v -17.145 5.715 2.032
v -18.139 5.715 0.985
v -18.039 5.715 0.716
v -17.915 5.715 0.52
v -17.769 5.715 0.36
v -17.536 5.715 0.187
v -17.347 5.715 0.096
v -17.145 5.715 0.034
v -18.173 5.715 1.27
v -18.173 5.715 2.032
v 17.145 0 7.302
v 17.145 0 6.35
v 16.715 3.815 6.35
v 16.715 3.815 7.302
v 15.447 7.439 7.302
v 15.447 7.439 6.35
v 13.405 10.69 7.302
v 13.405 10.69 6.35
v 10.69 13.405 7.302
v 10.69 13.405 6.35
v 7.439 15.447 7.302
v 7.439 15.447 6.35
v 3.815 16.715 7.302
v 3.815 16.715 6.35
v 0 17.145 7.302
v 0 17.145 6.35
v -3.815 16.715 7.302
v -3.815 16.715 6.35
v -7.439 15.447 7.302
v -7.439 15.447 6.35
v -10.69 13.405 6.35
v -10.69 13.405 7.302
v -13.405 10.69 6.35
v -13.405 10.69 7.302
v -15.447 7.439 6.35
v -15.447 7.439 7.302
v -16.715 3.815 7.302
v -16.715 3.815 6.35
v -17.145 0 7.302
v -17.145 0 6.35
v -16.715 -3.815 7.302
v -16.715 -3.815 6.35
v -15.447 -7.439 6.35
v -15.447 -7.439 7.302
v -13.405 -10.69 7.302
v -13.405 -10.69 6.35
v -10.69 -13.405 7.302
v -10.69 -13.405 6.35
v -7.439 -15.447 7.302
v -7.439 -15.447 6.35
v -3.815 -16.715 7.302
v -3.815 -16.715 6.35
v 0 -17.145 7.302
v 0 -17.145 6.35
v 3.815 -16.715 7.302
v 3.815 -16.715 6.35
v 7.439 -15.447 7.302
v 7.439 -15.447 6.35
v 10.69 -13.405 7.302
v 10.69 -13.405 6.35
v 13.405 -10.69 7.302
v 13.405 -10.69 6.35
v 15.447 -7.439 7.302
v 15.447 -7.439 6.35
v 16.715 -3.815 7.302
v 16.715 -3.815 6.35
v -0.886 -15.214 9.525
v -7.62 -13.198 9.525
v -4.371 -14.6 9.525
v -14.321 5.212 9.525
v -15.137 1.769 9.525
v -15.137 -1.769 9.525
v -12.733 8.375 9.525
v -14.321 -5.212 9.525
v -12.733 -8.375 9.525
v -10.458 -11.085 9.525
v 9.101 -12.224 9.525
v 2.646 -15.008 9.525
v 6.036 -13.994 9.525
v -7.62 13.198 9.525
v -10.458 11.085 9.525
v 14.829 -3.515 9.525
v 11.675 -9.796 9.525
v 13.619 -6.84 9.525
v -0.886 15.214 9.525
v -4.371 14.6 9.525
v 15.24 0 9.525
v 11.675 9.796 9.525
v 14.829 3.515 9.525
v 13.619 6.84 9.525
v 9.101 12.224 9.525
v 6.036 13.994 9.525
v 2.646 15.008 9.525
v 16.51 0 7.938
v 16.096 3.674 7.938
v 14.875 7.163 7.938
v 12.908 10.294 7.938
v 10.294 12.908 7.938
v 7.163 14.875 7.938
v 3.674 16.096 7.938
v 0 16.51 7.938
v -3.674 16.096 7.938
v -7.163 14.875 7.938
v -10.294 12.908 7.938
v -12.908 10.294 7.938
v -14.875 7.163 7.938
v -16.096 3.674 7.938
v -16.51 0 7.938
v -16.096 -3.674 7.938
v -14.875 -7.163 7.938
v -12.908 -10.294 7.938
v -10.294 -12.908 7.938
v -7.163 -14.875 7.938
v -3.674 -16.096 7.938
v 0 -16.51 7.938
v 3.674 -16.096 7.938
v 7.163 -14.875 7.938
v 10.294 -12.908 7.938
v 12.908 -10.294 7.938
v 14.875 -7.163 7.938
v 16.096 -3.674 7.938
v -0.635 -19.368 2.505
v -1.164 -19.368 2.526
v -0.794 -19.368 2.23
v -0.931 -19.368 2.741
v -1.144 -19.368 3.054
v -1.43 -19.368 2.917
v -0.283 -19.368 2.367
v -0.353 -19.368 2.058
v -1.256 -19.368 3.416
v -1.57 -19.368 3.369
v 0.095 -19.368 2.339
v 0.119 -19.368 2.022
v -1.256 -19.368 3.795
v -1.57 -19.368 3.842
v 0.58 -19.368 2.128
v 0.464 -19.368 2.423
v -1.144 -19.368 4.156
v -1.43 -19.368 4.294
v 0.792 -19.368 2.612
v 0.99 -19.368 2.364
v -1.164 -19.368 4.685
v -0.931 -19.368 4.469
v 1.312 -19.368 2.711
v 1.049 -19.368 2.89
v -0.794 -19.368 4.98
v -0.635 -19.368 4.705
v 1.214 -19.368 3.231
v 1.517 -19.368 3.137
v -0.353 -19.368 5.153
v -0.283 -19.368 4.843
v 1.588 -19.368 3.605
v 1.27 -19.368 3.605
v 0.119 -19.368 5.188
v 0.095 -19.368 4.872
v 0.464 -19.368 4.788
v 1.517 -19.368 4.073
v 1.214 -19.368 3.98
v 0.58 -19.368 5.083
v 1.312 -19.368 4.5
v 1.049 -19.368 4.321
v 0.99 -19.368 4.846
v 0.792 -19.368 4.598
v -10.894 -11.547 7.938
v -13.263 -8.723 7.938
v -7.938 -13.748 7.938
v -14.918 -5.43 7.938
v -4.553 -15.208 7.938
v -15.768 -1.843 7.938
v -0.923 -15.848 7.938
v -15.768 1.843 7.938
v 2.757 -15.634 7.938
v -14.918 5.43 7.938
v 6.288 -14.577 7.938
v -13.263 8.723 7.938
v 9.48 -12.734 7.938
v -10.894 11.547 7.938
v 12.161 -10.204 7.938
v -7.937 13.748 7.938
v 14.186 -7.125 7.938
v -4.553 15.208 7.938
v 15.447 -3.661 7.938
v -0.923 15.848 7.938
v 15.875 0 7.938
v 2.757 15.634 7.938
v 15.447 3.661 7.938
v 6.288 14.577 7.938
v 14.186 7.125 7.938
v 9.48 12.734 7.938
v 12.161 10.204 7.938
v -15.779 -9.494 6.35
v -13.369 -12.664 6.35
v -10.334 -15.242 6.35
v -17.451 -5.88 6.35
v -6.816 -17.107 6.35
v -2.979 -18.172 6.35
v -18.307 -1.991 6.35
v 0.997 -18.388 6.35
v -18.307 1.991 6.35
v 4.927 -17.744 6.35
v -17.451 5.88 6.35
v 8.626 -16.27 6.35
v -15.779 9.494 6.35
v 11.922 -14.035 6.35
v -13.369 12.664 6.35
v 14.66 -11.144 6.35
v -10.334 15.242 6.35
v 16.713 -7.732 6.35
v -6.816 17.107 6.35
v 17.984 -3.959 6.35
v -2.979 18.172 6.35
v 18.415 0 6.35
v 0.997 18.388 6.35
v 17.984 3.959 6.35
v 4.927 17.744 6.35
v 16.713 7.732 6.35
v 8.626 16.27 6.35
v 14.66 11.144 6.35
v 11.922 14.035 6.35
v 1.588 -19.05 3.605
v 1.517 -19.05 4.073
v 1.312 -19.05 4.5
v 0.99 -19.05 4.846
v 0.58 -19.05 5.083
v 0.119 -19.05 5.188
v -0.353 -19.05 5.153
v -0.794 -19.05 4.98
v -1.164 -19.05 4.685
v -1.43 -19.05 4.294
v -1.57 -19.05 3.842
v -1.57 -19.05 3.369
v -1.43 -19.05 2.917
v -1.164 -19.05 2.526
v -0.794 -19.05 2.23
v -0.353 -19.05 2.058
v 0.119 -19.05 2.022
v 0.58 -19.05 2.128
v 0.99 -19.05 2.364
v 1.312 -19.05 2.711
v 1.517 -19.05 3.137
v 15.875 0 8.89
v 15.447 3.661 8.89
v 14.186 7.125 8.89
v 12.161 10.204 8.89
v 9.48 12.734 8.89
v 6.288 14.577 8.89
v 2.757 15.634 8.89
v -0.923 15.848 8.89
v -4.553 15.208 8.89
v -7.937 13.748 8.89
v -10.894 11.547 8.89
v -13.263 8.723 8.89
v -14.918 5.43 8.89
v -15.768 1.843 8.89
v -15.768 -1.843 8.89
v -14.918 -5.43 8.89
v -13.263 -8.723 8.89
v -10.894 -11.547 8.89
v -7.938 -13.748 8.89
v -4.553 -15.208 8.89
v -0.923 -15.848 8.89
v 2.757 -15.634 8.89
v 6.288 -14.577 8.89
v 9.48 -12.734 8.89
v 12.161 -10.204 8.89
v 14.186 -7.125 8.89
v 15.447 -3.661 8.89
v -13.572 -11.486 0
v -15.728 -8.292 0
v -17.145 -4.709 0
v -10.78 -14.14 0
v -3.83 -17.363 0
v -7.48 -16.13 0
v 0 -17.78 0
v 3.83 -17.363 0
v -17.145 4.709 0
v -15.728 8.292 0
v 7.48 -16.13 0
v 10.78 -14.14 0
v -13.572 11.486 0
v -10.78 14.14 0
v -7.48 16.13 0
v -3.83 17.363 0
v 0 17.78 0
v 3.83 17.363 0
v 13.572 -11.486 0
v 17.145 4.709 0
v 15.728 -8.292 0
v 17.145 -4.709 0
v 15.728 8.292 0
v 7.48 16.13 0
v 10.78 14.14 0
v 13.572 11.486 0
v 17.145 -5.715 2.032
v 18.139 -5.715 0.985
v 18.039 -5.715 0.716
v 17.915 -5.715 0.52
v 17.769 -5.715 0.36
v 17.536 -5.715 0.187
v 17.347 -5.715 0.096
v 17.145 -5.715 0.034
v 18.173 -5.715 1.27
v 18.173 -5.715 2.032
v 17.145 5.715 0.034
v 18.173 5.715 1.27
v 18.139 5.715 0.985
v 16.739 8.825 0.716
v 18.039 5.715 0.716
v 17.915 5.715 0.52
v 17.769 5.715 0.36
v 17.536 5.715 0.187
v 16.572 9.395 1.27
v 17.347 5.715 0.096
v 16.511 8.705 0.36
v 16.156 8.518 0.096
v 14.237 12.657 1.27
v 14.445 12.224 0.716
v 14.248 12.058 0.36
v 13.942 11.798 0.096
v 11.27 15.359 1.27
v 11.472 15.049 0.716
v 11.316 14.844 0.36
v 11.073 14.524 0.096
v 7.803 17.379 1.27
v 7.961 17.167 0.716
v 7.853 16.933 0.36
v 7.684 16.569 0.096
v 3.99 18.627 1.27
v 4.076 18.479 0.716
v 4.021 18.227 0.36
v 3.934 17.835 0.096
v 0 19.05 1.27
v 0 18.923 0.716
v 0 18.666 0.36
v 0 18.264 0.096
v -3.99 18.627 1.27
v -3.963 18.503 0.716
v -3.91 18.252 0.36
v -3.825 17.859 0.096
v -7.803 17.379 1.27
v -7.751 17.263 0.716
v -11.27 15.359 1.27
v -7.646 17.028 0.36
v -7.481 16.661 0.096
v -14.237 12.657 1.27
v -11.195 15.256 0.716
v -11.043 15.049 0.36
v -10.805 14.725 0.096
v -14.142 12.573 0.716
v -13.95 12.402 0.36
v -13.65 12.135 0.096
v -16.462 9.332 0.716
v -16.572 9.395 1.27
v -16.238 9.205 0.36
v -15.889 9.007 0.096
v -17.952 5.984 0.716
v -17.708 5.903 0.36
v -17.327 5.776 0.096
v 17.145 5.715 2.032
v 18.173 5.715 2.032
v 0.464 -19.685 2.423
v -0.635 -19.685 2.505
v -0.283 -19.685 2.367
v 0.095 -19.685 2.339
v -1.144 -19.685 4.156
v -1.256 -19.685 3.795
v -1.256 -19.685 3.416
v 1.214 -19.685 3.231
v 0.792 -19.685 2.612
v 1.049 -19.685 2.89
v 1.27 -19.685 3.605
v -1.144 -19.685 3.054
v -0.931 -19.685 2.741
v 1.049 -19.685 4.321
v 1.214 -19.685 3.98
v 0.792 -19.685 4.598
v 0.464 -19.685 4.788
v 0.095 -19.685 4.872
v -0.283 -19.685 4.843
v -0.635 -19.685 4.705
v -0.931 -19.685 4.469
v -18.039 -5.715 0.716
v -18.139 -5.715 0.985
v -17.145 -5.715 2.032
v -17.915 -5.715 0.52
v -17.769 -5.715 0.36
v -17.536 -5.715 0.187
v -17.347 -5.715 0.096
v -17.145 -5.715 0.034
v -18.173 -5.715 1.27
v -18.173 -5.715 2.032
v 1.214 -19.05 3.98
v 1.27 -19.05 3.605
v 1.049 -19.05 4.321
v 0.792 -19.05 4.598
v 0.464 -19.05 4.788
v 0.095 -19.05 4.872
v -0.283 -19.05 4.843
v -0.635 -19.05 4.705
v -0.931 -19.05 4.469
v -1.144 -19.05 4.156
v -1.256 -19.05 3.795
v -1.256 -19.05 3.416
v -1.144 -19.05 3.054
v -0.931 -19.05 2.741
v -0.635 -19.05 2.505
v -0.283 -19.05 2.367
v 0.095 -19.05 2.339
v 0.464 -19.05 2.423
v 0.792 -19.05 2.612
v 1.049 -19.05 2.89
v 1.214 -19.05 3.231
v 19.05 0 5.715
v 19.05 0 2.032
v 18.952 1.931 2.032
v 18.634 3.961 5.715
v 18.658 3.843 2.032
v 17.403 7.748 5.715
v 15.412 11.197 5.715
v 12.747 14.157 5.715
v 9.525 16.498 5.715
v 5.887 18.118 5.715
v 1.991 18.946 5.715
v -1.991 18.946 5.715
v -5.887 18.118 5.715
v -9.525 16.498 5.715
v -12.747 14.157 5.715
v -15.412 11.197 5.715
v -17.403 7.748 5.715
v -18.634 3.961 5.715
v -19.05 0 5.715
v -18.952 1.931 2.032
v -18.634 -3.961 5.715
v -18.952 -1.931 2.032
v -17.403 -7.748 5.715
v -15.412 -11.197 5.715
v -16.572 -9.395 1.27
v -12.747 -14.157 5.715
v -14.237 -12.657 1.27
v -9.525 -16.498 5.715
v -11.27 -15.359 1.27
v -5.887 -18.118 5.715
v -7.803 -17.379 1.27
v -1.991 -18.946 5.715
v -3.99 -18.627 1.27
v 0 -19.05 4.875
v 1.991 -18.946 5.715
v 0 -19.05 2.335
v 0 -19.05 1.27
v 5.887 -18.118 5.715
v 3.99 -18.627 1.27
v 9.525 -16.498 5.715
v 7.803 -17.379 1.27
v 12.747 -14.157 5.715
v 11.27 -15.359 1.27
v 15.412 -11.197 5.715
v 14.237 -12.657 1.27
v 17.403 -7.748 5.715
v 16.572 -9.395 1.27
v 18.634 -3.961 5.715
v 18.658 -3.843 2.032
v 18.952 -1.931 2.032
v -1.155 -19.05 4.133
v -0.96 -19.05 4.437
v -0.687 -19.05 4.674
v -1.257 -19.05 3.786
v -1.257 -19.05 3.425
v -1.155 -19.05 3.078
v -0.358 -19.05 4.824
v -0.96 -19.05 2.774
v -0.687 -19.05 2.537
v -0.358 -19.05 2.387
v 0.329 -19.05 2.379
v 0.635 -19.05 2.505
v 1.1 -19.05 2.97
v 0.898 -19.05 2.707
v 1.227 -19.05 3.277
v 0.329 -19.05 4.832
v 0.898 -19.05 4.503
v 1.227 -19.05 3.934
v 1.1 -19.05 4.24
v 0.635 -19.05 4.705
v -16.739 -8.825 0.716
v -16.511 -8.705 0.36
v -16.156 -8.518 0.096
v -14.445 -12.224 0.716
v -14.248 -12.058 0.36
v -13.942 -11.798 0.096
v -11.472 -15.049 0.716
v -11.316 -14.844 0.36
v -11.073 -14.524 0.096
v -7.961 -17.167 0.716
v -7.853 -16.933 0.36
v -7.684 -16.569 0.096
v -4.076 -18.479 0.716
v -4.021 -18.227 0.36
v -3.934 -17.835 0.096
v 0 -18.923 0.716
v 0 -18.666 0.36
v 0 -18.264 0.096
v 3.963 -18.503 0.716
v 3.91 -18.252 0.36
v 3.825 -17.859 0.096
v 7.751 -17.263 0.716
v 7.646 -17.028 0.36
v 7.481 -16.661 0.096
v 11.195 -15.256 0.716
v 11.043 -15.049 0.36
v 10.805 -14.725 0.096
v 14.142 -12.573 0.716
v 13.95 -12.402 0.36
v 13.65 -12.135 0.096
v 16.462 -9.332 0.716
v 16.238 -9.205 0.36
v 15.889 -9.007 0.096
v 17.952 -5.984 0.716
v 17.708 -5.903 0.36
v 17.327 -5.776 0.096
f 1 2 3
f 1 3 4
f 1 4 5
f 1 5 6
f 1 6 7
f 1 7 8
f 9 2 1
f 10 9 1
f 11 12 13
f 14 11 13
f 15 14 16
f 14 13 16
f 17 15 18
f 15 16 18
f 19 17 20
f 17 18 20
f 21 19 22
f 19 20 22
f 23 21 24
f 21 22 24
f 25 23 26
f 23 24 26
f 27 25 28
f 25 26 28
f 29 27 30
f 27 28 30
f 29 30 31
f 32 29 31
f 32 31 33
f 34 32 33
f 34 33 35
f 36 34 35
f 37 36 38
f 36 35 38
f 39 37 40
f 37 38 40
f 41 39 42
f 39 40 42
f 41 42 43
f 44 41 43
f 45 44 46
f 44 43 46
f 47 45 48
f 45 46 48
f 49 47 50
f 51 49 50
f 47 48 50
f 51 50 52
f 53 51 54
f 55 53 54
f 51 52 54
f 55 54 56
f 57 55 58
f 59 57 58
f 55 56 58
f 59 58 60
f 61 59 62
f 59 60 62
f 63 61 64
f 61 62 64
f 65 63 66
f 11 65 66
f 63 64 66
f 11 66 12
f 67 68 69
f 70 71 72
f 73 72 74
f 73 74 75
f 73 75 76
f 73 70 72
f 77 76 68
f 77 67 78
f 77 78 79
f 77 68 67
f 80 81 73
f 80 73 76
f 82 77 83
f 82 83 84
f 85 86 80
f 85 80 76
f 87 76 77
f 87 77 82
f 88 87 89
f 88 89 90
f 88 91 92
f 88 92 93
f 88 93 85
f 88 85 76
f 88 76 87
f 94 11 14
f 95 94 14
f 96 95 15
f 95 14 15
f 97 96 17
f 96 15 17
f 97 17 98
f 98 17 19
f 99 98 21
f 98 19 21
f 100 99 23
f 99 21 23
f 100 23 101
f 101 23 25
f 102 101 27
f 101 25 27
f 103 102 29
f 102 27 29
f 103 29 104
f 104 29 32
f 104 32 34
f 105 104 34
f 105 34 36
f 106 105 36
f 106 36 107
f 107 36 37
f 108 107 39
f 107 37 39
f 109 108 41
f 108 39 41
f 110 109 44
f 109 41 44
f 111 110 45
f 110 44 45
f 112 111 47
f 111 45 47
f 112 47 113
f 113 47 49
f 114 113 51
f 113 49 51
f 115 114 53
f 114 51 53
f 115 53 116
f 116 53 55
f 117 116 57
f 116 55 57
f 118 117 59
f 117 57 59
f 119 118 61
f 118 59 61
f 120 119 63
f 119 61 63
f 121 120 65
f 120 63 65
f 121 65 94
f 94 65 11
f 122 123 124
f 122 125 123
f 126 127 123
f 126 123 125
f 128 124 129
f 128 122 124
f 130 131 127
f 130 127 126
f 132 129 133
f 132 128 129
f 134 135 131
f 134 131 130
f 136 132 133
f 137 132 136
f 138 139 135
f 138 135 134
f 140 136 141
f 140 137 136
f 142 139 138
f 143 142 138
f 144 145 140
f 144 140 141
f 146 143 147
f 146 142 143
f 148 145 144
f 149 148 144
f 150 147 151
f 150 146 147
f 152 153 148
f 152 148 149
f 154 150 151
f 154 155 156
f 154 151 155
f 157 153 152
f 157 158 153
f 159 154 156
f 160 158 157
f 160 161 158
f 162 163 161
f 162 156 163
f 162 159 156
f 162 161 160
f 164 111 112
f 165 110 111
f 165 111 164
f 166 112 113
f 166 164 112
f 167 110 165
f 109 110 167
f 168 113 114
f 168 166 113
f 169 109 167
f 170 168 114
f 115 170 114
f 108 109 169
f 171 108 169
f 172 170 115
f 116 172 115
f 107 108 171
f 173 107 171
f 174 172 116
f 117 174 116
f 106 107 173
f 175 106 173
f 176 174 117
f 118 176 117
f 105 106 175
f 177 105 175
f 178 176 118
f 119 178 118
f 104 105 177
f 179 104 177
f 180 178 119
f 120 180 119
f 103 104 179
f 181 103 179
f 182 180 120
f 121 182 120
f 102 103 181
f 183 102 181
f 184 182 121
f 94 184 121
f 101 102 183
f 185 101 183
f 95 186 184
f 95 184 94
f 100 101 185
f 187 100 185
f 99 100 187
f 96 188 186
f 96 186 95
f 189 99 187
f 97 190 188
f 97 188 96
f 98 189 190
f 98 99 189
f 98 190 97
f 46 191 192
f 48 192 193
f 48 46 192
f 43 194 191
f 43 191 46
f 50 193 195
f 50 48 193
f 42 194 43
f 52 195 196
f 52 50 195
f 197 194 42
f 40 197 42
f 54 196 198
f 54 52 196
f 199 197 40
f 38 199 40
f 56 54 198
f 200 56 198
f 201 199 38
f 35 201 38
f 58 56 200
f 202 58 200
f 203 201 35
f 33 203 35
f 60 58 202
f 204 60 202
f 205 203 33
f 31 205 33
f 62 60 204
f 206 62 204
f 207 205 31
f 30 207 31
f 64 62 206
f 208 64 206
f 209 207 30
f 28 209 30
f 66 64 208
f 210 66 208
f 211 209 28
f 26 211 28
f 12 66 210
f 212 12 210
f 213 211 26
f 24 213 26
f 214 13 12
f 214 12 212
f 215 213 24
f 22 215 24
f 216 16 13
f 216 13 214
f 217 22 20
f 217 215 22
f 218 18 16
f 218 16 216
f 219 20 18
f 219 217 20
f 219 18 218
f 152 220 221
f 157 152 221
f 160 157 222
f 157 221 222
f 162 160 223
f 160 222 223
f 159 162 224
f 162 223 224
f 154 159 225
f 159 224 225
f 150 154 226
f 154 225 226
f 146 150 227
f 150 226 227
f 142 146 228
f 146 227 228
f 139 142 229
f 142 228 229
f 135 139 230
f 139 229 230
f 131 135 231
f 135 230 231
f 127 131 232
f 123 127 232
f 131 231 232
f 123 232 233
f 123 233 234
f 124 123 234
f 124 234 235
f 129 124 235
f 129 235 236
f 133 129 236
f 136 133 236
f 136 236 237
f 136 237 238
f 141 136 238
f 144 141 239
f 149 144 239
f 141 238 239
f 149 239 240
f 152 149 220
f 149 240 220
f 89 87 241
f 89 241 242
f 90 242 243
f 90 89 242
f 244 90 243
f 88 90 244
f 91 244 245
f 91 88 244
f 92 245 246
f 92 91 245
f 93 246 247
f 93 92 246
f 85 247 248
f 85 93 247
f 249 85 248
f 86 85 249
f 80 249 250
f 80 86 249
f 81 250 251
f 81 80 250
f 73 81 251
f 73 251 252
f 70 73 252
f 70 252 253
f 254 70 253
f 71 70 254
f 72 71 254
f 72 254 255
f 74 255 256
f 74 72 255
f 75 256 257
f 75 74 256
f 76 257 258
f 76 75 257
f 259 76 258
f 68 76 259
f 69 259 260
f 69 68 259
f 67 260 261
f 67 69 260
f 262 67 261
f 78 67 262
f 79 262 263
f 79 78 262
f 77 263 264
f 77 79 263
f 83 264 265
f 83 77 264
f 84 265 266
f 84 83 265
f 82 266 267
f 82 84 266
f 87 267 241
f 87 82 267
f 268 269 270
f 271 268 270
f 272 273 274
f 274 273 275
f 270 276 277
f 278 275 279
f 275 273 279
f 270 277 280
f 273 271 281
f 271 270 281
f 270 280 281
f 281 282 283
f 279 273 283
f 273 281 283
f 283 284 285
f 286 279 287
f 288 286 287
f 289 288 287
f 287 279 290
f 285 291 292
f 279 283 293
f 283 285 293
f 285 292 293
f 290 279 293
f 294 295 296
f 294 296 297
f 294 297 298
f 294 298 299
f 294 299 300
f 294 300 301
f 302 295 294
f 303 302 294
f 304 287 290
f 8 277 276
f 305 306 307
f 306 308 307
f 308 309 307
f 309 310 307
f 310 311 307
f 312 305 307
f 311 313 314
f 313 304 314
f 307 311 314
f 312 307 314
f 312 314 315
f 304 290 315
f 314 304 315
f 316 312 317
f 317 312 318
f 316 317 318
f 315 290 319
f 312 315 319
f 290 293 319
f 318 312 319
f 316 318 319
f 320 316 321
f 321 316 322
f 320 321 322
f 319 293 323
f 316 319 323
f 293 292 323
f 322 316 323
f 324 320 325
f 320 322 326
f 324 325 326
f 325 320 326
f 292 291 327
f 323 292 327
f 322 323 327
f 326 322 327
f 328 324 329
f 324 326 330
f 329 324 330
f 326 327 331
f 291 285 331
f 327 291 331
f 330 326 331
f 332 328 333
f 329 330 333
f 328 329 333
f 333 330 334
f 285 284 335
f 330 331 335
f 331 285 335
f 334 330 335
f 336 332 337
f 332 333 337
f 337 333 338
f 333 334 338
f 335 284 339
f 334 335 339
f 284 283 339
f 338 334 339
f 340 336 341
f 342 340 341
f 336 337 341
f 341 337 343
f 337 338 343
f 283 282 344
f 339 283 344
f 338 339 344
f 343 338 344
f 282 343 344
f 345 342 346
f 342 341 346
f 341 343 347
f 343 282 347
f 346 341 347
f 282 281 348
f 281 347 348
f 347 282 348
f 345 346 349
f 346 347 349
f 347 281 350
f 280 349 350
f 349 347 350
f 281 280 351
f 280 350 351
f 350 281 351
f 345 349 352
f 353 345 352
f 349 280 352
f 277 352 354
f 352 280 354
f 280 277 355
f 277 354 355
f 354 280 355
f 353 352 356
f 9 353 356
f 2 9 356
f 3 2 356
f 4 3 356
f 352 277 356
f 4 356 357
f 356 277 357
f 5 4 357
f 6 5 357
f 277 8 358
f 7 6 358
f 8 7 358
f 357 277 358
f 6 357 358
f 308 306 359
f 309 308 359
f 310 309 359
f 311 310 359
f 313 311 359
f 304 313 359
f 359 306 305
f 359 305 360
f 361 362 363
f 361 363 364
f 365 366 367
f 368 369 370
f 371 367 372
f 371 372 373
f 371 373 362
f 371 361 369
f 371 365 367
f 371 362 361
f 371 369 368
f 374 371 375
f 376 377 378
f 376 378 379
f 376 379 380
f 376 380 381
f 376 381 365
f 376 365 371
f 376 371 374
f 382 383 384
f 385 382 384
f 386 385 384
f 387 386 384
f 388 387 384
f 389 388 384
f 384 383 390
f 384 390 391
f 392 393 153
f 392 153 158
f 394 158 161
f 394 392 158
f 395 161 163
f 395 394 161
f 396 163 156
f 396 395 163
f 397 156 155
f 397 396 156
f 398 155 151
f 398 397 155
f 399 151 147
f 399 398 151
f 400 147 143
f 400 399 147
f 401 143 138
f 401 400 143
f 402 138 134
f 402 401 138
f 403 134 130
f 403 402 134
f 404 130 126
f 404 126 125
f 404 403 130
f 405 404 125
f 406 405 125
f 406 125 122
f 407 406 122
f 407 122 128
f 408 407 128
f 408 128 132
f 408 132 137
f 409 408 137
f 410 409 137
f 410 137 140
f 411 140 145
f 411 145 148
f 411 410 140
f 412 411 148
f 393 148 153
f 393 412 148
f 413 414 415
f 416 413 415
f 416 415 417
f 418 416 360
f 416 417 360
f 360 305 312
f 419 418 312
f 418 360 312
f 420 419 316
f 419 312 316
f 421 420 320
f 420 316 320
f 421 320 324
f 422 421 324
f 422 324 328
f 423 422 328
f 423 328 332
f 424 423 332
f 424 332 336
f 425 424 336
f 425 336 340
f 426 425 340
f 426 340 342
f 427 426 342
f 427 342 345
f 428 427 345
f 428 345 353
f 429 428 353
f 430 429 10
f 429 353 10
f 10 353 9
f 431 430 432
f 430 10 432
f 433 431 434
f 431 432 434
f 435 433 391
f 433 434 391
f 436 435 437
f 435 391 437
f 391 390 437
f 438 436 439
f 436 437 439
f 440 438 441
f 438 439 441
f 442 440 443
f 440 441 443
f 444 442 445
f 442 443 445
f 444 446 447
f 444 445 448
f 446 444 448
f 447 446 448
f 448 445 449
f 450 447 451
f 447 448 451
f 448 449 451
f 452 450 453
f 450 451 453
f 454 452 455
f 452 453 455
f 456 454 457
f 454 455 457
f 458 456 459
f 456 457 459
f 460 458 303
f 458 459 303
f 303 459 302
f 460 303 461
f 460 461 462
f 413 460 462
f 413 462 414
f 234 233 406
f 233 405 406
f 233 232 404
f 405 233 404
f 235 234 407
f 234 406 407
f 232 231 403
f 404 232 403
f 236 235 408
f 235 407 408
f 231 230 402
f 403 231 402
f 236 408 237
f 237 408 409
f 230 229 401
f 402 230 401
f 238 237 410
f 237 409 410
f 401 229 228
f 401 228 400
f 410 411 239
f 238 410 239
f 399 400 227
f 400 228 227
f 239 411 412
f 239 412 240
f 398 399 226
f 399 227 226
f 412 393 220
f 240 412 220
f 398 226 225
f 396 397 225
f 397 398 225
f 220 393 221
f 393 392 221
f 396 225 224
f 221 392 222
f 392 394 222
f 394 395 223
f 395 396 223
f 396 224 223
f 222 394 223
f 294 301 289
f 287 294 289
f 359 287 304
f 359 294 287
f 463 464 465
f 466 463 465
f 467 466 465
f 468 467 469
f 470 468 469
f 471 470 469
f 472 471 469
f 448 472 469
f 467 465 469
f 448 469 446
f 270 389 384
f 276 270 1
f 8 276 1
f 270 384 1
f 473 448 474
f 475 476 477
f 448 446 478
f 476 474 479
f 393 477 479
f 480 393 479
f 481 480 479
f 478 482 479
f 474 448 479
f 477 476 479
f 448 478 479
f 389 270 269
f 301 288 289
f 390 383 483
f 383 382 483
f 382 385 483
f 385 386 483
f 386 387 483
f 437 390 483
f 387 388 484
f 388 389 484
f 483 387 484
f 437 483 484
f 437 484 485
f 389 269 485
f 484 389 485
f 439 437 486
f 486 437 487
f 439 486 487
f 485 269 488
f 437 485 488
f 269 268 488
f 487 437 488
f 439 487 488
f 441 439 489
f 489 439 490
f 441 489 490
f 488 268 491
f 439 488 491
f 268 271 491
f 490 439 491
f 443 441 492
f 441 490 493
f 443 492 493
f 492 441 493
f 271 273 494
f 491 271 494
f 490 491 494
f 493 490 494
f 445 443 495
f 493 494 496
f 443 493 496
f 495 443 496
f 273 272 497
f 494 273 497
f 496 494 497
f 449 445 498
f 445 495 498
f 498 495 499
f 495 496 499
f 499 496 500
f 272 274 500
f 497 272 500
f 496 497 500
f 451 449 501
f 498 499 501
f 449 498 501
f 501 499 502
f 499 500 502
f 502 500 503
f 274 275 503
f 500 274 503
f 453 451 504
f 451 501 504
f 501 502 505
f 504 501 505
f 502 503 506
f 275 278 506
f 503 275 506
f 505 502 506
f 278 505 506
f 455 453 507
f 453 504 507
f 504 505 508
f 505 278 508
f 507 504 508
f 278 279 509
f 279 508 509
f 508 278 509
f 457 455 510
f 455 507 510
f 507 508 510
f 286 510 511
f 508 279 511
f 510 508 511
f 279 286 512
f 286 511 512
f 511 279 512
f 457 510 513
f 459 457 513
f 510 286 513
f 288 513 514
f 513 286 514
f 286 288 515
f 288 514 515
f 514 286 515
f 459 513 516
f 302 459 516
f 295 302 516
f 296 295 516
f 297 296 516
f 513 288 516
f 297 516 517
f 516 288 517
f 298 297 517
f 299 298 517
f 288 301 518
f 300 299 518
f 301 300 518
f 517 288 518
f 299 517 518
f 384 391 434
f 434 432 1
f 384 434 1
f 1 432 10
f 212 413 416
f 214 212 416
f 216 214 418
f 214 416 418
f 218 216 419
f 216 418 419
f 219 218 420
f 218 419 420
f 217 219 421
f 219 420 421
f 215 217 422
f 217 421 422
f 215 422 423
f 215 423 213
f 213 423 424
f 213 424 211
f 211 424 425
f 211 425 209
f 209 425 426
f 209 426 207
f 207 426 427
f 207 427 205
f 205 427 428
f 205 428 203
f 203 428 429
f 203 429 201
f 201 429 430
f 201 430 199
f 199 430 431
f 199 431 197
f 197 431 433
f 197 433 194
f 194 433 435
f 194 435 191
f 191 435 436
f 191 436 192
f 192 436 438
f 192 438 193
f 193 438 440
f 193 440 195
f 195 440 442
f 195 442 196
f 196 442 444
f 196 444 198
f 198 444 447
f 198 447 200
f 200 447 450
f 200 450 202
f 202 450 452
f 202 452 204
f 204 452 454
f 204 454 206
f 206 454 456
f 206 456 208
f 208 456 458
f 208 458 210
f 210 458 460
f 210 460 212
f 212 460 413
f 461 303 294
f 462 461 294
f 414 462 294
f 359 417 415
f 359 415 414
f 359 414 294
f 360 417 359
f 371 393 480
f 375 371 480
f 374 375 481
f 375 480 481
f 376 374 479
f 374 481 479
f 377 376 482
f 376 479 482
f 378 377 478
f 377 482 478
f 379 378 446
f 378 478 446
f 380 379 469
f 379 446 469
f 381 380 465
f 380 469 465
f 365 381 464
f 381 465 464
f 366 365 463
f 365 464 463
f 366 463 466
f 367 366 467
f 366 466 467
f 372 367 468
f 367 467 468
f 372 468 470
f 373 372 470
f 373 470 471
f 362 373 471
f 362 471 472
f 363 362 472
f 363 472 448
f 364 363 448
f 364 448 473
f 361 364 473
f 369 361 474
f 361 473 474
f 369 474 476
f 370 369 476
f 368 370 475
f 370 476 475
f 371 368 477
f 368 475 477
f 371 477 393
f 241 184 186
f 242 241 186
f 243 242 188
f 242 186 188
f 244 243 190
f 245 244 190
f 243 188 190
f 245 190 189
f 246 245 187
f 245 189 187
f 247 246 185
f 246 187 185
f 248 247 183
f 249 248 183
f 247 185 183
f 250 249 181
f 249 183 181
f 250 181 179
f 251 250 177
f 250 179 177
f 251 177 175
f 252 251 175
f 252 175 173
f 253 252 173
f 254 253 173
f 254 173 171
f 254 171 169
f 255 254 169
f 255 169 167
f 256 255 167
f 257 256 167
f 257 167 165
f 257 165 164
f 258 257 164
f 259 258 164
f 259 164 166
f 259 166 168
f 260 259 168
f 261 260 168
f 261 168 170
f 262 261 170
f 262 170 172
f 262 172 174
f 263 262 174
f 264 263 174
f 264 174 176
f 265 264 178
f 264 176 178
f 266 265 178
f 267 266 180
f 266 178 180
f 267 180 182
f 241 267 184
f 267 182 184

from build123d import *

# Parameters (mm, degrees)
F0_R      = 19.05
F1_DEPTH  = 6.35
F2_R      = 17.145
F2_R_2    = 15.875
F3_DEPTH  = 1.5875
F3_FACE_R = 15.875
F4_DEPTH  = 3.175
F5_SIZE   = 0.635
F6_R      = 1.27
F8_R      = 1.27
F9_DEPTH  = 0.635
F8_R_2    = 1.5875
F10_DEPTH = 0.3175
F12_W     = 11.43
F12_H     = 4.064
F13_DEPTH = 1.905
F15_W     = 11.43
F15_H     = 4.064
F16_DEPTH = 1.905


with BuildPart() as f1:
    # F0 (on Top) → F1 (new body)
    with BuildSketch(Plane.XY):
        Circle(F0_R)
    extrude(amount=F1_DEPTH)

    # F2 (on face) → F3 (join)
    with BuildSketch(Plane.XY.offset(6.35)):
        Circle(F2_R)
        Circle(F2_R_2, mode=Mode.SUBTRACT)
    extrude(amount=F3_DEPTH)

    # F3_face (on face) → F4 (join)
    with BuildSketch(Plane.XY.offset(6.35)):
        Circle(F3_FACE_R)
    extrude(amount=F4_DEPTH)

    # F5
    f5_edges = [f1.edges().sort_by_distance(p)[0] for p in [
        (-19.05, 0, 6.35),
        (-17.145, 0, 7.9375),
        (-15.875, 0, 9.525),
    ]]
    chamfer(f5_edges, length=F5_SIZE)

    # F6
    f6_edges = [f1.edges().sort_by_distance(p)[0] for p in [
        (-19.05, 0, 0),
    ]]
    fillet(f6_edges, radius=F6_R)

    # F8 (on offset) → F9 (join)
    with BuildSketch(Plane.XZ.offset(19.05)):
        with Locations((0, 3.605308)):
            Circle(F8_R)
    extrude(amount=F9_DEPTH)

    # F12 (on offset) → F13 (cut)
    with BuildSketch(Plane.YZ.offset(19.05)):
        Rectangle(F12_W, F12_H)
    extrude(amount=-F13_DEPTH, mode=Mode.SUBTRACT)

    # F15 (on offset) → F16 (cut)
    with BuildSketch(Plane.YZ.offset(-19.05)):
        Rectangle(F15_W, F15_H)
    extrude(amount=F16_DEPTH, mode=Mode.SUBTRACT)


with BuildPart() as f10:
    # F8 (on offset) → F10 (new body)
    with BuildSketch(Plane.XZ.offset(19.05)):
        with Locations((0, 3.605308)):
            Circle(F8_R_2)
        with Locations((0, 3.605308)):
            Circle(F8_R, mode=Mode.SUBTRACT)
    extrude(amount=F10_DEPTH)


solid = Compound([f1.part, f10.part])
